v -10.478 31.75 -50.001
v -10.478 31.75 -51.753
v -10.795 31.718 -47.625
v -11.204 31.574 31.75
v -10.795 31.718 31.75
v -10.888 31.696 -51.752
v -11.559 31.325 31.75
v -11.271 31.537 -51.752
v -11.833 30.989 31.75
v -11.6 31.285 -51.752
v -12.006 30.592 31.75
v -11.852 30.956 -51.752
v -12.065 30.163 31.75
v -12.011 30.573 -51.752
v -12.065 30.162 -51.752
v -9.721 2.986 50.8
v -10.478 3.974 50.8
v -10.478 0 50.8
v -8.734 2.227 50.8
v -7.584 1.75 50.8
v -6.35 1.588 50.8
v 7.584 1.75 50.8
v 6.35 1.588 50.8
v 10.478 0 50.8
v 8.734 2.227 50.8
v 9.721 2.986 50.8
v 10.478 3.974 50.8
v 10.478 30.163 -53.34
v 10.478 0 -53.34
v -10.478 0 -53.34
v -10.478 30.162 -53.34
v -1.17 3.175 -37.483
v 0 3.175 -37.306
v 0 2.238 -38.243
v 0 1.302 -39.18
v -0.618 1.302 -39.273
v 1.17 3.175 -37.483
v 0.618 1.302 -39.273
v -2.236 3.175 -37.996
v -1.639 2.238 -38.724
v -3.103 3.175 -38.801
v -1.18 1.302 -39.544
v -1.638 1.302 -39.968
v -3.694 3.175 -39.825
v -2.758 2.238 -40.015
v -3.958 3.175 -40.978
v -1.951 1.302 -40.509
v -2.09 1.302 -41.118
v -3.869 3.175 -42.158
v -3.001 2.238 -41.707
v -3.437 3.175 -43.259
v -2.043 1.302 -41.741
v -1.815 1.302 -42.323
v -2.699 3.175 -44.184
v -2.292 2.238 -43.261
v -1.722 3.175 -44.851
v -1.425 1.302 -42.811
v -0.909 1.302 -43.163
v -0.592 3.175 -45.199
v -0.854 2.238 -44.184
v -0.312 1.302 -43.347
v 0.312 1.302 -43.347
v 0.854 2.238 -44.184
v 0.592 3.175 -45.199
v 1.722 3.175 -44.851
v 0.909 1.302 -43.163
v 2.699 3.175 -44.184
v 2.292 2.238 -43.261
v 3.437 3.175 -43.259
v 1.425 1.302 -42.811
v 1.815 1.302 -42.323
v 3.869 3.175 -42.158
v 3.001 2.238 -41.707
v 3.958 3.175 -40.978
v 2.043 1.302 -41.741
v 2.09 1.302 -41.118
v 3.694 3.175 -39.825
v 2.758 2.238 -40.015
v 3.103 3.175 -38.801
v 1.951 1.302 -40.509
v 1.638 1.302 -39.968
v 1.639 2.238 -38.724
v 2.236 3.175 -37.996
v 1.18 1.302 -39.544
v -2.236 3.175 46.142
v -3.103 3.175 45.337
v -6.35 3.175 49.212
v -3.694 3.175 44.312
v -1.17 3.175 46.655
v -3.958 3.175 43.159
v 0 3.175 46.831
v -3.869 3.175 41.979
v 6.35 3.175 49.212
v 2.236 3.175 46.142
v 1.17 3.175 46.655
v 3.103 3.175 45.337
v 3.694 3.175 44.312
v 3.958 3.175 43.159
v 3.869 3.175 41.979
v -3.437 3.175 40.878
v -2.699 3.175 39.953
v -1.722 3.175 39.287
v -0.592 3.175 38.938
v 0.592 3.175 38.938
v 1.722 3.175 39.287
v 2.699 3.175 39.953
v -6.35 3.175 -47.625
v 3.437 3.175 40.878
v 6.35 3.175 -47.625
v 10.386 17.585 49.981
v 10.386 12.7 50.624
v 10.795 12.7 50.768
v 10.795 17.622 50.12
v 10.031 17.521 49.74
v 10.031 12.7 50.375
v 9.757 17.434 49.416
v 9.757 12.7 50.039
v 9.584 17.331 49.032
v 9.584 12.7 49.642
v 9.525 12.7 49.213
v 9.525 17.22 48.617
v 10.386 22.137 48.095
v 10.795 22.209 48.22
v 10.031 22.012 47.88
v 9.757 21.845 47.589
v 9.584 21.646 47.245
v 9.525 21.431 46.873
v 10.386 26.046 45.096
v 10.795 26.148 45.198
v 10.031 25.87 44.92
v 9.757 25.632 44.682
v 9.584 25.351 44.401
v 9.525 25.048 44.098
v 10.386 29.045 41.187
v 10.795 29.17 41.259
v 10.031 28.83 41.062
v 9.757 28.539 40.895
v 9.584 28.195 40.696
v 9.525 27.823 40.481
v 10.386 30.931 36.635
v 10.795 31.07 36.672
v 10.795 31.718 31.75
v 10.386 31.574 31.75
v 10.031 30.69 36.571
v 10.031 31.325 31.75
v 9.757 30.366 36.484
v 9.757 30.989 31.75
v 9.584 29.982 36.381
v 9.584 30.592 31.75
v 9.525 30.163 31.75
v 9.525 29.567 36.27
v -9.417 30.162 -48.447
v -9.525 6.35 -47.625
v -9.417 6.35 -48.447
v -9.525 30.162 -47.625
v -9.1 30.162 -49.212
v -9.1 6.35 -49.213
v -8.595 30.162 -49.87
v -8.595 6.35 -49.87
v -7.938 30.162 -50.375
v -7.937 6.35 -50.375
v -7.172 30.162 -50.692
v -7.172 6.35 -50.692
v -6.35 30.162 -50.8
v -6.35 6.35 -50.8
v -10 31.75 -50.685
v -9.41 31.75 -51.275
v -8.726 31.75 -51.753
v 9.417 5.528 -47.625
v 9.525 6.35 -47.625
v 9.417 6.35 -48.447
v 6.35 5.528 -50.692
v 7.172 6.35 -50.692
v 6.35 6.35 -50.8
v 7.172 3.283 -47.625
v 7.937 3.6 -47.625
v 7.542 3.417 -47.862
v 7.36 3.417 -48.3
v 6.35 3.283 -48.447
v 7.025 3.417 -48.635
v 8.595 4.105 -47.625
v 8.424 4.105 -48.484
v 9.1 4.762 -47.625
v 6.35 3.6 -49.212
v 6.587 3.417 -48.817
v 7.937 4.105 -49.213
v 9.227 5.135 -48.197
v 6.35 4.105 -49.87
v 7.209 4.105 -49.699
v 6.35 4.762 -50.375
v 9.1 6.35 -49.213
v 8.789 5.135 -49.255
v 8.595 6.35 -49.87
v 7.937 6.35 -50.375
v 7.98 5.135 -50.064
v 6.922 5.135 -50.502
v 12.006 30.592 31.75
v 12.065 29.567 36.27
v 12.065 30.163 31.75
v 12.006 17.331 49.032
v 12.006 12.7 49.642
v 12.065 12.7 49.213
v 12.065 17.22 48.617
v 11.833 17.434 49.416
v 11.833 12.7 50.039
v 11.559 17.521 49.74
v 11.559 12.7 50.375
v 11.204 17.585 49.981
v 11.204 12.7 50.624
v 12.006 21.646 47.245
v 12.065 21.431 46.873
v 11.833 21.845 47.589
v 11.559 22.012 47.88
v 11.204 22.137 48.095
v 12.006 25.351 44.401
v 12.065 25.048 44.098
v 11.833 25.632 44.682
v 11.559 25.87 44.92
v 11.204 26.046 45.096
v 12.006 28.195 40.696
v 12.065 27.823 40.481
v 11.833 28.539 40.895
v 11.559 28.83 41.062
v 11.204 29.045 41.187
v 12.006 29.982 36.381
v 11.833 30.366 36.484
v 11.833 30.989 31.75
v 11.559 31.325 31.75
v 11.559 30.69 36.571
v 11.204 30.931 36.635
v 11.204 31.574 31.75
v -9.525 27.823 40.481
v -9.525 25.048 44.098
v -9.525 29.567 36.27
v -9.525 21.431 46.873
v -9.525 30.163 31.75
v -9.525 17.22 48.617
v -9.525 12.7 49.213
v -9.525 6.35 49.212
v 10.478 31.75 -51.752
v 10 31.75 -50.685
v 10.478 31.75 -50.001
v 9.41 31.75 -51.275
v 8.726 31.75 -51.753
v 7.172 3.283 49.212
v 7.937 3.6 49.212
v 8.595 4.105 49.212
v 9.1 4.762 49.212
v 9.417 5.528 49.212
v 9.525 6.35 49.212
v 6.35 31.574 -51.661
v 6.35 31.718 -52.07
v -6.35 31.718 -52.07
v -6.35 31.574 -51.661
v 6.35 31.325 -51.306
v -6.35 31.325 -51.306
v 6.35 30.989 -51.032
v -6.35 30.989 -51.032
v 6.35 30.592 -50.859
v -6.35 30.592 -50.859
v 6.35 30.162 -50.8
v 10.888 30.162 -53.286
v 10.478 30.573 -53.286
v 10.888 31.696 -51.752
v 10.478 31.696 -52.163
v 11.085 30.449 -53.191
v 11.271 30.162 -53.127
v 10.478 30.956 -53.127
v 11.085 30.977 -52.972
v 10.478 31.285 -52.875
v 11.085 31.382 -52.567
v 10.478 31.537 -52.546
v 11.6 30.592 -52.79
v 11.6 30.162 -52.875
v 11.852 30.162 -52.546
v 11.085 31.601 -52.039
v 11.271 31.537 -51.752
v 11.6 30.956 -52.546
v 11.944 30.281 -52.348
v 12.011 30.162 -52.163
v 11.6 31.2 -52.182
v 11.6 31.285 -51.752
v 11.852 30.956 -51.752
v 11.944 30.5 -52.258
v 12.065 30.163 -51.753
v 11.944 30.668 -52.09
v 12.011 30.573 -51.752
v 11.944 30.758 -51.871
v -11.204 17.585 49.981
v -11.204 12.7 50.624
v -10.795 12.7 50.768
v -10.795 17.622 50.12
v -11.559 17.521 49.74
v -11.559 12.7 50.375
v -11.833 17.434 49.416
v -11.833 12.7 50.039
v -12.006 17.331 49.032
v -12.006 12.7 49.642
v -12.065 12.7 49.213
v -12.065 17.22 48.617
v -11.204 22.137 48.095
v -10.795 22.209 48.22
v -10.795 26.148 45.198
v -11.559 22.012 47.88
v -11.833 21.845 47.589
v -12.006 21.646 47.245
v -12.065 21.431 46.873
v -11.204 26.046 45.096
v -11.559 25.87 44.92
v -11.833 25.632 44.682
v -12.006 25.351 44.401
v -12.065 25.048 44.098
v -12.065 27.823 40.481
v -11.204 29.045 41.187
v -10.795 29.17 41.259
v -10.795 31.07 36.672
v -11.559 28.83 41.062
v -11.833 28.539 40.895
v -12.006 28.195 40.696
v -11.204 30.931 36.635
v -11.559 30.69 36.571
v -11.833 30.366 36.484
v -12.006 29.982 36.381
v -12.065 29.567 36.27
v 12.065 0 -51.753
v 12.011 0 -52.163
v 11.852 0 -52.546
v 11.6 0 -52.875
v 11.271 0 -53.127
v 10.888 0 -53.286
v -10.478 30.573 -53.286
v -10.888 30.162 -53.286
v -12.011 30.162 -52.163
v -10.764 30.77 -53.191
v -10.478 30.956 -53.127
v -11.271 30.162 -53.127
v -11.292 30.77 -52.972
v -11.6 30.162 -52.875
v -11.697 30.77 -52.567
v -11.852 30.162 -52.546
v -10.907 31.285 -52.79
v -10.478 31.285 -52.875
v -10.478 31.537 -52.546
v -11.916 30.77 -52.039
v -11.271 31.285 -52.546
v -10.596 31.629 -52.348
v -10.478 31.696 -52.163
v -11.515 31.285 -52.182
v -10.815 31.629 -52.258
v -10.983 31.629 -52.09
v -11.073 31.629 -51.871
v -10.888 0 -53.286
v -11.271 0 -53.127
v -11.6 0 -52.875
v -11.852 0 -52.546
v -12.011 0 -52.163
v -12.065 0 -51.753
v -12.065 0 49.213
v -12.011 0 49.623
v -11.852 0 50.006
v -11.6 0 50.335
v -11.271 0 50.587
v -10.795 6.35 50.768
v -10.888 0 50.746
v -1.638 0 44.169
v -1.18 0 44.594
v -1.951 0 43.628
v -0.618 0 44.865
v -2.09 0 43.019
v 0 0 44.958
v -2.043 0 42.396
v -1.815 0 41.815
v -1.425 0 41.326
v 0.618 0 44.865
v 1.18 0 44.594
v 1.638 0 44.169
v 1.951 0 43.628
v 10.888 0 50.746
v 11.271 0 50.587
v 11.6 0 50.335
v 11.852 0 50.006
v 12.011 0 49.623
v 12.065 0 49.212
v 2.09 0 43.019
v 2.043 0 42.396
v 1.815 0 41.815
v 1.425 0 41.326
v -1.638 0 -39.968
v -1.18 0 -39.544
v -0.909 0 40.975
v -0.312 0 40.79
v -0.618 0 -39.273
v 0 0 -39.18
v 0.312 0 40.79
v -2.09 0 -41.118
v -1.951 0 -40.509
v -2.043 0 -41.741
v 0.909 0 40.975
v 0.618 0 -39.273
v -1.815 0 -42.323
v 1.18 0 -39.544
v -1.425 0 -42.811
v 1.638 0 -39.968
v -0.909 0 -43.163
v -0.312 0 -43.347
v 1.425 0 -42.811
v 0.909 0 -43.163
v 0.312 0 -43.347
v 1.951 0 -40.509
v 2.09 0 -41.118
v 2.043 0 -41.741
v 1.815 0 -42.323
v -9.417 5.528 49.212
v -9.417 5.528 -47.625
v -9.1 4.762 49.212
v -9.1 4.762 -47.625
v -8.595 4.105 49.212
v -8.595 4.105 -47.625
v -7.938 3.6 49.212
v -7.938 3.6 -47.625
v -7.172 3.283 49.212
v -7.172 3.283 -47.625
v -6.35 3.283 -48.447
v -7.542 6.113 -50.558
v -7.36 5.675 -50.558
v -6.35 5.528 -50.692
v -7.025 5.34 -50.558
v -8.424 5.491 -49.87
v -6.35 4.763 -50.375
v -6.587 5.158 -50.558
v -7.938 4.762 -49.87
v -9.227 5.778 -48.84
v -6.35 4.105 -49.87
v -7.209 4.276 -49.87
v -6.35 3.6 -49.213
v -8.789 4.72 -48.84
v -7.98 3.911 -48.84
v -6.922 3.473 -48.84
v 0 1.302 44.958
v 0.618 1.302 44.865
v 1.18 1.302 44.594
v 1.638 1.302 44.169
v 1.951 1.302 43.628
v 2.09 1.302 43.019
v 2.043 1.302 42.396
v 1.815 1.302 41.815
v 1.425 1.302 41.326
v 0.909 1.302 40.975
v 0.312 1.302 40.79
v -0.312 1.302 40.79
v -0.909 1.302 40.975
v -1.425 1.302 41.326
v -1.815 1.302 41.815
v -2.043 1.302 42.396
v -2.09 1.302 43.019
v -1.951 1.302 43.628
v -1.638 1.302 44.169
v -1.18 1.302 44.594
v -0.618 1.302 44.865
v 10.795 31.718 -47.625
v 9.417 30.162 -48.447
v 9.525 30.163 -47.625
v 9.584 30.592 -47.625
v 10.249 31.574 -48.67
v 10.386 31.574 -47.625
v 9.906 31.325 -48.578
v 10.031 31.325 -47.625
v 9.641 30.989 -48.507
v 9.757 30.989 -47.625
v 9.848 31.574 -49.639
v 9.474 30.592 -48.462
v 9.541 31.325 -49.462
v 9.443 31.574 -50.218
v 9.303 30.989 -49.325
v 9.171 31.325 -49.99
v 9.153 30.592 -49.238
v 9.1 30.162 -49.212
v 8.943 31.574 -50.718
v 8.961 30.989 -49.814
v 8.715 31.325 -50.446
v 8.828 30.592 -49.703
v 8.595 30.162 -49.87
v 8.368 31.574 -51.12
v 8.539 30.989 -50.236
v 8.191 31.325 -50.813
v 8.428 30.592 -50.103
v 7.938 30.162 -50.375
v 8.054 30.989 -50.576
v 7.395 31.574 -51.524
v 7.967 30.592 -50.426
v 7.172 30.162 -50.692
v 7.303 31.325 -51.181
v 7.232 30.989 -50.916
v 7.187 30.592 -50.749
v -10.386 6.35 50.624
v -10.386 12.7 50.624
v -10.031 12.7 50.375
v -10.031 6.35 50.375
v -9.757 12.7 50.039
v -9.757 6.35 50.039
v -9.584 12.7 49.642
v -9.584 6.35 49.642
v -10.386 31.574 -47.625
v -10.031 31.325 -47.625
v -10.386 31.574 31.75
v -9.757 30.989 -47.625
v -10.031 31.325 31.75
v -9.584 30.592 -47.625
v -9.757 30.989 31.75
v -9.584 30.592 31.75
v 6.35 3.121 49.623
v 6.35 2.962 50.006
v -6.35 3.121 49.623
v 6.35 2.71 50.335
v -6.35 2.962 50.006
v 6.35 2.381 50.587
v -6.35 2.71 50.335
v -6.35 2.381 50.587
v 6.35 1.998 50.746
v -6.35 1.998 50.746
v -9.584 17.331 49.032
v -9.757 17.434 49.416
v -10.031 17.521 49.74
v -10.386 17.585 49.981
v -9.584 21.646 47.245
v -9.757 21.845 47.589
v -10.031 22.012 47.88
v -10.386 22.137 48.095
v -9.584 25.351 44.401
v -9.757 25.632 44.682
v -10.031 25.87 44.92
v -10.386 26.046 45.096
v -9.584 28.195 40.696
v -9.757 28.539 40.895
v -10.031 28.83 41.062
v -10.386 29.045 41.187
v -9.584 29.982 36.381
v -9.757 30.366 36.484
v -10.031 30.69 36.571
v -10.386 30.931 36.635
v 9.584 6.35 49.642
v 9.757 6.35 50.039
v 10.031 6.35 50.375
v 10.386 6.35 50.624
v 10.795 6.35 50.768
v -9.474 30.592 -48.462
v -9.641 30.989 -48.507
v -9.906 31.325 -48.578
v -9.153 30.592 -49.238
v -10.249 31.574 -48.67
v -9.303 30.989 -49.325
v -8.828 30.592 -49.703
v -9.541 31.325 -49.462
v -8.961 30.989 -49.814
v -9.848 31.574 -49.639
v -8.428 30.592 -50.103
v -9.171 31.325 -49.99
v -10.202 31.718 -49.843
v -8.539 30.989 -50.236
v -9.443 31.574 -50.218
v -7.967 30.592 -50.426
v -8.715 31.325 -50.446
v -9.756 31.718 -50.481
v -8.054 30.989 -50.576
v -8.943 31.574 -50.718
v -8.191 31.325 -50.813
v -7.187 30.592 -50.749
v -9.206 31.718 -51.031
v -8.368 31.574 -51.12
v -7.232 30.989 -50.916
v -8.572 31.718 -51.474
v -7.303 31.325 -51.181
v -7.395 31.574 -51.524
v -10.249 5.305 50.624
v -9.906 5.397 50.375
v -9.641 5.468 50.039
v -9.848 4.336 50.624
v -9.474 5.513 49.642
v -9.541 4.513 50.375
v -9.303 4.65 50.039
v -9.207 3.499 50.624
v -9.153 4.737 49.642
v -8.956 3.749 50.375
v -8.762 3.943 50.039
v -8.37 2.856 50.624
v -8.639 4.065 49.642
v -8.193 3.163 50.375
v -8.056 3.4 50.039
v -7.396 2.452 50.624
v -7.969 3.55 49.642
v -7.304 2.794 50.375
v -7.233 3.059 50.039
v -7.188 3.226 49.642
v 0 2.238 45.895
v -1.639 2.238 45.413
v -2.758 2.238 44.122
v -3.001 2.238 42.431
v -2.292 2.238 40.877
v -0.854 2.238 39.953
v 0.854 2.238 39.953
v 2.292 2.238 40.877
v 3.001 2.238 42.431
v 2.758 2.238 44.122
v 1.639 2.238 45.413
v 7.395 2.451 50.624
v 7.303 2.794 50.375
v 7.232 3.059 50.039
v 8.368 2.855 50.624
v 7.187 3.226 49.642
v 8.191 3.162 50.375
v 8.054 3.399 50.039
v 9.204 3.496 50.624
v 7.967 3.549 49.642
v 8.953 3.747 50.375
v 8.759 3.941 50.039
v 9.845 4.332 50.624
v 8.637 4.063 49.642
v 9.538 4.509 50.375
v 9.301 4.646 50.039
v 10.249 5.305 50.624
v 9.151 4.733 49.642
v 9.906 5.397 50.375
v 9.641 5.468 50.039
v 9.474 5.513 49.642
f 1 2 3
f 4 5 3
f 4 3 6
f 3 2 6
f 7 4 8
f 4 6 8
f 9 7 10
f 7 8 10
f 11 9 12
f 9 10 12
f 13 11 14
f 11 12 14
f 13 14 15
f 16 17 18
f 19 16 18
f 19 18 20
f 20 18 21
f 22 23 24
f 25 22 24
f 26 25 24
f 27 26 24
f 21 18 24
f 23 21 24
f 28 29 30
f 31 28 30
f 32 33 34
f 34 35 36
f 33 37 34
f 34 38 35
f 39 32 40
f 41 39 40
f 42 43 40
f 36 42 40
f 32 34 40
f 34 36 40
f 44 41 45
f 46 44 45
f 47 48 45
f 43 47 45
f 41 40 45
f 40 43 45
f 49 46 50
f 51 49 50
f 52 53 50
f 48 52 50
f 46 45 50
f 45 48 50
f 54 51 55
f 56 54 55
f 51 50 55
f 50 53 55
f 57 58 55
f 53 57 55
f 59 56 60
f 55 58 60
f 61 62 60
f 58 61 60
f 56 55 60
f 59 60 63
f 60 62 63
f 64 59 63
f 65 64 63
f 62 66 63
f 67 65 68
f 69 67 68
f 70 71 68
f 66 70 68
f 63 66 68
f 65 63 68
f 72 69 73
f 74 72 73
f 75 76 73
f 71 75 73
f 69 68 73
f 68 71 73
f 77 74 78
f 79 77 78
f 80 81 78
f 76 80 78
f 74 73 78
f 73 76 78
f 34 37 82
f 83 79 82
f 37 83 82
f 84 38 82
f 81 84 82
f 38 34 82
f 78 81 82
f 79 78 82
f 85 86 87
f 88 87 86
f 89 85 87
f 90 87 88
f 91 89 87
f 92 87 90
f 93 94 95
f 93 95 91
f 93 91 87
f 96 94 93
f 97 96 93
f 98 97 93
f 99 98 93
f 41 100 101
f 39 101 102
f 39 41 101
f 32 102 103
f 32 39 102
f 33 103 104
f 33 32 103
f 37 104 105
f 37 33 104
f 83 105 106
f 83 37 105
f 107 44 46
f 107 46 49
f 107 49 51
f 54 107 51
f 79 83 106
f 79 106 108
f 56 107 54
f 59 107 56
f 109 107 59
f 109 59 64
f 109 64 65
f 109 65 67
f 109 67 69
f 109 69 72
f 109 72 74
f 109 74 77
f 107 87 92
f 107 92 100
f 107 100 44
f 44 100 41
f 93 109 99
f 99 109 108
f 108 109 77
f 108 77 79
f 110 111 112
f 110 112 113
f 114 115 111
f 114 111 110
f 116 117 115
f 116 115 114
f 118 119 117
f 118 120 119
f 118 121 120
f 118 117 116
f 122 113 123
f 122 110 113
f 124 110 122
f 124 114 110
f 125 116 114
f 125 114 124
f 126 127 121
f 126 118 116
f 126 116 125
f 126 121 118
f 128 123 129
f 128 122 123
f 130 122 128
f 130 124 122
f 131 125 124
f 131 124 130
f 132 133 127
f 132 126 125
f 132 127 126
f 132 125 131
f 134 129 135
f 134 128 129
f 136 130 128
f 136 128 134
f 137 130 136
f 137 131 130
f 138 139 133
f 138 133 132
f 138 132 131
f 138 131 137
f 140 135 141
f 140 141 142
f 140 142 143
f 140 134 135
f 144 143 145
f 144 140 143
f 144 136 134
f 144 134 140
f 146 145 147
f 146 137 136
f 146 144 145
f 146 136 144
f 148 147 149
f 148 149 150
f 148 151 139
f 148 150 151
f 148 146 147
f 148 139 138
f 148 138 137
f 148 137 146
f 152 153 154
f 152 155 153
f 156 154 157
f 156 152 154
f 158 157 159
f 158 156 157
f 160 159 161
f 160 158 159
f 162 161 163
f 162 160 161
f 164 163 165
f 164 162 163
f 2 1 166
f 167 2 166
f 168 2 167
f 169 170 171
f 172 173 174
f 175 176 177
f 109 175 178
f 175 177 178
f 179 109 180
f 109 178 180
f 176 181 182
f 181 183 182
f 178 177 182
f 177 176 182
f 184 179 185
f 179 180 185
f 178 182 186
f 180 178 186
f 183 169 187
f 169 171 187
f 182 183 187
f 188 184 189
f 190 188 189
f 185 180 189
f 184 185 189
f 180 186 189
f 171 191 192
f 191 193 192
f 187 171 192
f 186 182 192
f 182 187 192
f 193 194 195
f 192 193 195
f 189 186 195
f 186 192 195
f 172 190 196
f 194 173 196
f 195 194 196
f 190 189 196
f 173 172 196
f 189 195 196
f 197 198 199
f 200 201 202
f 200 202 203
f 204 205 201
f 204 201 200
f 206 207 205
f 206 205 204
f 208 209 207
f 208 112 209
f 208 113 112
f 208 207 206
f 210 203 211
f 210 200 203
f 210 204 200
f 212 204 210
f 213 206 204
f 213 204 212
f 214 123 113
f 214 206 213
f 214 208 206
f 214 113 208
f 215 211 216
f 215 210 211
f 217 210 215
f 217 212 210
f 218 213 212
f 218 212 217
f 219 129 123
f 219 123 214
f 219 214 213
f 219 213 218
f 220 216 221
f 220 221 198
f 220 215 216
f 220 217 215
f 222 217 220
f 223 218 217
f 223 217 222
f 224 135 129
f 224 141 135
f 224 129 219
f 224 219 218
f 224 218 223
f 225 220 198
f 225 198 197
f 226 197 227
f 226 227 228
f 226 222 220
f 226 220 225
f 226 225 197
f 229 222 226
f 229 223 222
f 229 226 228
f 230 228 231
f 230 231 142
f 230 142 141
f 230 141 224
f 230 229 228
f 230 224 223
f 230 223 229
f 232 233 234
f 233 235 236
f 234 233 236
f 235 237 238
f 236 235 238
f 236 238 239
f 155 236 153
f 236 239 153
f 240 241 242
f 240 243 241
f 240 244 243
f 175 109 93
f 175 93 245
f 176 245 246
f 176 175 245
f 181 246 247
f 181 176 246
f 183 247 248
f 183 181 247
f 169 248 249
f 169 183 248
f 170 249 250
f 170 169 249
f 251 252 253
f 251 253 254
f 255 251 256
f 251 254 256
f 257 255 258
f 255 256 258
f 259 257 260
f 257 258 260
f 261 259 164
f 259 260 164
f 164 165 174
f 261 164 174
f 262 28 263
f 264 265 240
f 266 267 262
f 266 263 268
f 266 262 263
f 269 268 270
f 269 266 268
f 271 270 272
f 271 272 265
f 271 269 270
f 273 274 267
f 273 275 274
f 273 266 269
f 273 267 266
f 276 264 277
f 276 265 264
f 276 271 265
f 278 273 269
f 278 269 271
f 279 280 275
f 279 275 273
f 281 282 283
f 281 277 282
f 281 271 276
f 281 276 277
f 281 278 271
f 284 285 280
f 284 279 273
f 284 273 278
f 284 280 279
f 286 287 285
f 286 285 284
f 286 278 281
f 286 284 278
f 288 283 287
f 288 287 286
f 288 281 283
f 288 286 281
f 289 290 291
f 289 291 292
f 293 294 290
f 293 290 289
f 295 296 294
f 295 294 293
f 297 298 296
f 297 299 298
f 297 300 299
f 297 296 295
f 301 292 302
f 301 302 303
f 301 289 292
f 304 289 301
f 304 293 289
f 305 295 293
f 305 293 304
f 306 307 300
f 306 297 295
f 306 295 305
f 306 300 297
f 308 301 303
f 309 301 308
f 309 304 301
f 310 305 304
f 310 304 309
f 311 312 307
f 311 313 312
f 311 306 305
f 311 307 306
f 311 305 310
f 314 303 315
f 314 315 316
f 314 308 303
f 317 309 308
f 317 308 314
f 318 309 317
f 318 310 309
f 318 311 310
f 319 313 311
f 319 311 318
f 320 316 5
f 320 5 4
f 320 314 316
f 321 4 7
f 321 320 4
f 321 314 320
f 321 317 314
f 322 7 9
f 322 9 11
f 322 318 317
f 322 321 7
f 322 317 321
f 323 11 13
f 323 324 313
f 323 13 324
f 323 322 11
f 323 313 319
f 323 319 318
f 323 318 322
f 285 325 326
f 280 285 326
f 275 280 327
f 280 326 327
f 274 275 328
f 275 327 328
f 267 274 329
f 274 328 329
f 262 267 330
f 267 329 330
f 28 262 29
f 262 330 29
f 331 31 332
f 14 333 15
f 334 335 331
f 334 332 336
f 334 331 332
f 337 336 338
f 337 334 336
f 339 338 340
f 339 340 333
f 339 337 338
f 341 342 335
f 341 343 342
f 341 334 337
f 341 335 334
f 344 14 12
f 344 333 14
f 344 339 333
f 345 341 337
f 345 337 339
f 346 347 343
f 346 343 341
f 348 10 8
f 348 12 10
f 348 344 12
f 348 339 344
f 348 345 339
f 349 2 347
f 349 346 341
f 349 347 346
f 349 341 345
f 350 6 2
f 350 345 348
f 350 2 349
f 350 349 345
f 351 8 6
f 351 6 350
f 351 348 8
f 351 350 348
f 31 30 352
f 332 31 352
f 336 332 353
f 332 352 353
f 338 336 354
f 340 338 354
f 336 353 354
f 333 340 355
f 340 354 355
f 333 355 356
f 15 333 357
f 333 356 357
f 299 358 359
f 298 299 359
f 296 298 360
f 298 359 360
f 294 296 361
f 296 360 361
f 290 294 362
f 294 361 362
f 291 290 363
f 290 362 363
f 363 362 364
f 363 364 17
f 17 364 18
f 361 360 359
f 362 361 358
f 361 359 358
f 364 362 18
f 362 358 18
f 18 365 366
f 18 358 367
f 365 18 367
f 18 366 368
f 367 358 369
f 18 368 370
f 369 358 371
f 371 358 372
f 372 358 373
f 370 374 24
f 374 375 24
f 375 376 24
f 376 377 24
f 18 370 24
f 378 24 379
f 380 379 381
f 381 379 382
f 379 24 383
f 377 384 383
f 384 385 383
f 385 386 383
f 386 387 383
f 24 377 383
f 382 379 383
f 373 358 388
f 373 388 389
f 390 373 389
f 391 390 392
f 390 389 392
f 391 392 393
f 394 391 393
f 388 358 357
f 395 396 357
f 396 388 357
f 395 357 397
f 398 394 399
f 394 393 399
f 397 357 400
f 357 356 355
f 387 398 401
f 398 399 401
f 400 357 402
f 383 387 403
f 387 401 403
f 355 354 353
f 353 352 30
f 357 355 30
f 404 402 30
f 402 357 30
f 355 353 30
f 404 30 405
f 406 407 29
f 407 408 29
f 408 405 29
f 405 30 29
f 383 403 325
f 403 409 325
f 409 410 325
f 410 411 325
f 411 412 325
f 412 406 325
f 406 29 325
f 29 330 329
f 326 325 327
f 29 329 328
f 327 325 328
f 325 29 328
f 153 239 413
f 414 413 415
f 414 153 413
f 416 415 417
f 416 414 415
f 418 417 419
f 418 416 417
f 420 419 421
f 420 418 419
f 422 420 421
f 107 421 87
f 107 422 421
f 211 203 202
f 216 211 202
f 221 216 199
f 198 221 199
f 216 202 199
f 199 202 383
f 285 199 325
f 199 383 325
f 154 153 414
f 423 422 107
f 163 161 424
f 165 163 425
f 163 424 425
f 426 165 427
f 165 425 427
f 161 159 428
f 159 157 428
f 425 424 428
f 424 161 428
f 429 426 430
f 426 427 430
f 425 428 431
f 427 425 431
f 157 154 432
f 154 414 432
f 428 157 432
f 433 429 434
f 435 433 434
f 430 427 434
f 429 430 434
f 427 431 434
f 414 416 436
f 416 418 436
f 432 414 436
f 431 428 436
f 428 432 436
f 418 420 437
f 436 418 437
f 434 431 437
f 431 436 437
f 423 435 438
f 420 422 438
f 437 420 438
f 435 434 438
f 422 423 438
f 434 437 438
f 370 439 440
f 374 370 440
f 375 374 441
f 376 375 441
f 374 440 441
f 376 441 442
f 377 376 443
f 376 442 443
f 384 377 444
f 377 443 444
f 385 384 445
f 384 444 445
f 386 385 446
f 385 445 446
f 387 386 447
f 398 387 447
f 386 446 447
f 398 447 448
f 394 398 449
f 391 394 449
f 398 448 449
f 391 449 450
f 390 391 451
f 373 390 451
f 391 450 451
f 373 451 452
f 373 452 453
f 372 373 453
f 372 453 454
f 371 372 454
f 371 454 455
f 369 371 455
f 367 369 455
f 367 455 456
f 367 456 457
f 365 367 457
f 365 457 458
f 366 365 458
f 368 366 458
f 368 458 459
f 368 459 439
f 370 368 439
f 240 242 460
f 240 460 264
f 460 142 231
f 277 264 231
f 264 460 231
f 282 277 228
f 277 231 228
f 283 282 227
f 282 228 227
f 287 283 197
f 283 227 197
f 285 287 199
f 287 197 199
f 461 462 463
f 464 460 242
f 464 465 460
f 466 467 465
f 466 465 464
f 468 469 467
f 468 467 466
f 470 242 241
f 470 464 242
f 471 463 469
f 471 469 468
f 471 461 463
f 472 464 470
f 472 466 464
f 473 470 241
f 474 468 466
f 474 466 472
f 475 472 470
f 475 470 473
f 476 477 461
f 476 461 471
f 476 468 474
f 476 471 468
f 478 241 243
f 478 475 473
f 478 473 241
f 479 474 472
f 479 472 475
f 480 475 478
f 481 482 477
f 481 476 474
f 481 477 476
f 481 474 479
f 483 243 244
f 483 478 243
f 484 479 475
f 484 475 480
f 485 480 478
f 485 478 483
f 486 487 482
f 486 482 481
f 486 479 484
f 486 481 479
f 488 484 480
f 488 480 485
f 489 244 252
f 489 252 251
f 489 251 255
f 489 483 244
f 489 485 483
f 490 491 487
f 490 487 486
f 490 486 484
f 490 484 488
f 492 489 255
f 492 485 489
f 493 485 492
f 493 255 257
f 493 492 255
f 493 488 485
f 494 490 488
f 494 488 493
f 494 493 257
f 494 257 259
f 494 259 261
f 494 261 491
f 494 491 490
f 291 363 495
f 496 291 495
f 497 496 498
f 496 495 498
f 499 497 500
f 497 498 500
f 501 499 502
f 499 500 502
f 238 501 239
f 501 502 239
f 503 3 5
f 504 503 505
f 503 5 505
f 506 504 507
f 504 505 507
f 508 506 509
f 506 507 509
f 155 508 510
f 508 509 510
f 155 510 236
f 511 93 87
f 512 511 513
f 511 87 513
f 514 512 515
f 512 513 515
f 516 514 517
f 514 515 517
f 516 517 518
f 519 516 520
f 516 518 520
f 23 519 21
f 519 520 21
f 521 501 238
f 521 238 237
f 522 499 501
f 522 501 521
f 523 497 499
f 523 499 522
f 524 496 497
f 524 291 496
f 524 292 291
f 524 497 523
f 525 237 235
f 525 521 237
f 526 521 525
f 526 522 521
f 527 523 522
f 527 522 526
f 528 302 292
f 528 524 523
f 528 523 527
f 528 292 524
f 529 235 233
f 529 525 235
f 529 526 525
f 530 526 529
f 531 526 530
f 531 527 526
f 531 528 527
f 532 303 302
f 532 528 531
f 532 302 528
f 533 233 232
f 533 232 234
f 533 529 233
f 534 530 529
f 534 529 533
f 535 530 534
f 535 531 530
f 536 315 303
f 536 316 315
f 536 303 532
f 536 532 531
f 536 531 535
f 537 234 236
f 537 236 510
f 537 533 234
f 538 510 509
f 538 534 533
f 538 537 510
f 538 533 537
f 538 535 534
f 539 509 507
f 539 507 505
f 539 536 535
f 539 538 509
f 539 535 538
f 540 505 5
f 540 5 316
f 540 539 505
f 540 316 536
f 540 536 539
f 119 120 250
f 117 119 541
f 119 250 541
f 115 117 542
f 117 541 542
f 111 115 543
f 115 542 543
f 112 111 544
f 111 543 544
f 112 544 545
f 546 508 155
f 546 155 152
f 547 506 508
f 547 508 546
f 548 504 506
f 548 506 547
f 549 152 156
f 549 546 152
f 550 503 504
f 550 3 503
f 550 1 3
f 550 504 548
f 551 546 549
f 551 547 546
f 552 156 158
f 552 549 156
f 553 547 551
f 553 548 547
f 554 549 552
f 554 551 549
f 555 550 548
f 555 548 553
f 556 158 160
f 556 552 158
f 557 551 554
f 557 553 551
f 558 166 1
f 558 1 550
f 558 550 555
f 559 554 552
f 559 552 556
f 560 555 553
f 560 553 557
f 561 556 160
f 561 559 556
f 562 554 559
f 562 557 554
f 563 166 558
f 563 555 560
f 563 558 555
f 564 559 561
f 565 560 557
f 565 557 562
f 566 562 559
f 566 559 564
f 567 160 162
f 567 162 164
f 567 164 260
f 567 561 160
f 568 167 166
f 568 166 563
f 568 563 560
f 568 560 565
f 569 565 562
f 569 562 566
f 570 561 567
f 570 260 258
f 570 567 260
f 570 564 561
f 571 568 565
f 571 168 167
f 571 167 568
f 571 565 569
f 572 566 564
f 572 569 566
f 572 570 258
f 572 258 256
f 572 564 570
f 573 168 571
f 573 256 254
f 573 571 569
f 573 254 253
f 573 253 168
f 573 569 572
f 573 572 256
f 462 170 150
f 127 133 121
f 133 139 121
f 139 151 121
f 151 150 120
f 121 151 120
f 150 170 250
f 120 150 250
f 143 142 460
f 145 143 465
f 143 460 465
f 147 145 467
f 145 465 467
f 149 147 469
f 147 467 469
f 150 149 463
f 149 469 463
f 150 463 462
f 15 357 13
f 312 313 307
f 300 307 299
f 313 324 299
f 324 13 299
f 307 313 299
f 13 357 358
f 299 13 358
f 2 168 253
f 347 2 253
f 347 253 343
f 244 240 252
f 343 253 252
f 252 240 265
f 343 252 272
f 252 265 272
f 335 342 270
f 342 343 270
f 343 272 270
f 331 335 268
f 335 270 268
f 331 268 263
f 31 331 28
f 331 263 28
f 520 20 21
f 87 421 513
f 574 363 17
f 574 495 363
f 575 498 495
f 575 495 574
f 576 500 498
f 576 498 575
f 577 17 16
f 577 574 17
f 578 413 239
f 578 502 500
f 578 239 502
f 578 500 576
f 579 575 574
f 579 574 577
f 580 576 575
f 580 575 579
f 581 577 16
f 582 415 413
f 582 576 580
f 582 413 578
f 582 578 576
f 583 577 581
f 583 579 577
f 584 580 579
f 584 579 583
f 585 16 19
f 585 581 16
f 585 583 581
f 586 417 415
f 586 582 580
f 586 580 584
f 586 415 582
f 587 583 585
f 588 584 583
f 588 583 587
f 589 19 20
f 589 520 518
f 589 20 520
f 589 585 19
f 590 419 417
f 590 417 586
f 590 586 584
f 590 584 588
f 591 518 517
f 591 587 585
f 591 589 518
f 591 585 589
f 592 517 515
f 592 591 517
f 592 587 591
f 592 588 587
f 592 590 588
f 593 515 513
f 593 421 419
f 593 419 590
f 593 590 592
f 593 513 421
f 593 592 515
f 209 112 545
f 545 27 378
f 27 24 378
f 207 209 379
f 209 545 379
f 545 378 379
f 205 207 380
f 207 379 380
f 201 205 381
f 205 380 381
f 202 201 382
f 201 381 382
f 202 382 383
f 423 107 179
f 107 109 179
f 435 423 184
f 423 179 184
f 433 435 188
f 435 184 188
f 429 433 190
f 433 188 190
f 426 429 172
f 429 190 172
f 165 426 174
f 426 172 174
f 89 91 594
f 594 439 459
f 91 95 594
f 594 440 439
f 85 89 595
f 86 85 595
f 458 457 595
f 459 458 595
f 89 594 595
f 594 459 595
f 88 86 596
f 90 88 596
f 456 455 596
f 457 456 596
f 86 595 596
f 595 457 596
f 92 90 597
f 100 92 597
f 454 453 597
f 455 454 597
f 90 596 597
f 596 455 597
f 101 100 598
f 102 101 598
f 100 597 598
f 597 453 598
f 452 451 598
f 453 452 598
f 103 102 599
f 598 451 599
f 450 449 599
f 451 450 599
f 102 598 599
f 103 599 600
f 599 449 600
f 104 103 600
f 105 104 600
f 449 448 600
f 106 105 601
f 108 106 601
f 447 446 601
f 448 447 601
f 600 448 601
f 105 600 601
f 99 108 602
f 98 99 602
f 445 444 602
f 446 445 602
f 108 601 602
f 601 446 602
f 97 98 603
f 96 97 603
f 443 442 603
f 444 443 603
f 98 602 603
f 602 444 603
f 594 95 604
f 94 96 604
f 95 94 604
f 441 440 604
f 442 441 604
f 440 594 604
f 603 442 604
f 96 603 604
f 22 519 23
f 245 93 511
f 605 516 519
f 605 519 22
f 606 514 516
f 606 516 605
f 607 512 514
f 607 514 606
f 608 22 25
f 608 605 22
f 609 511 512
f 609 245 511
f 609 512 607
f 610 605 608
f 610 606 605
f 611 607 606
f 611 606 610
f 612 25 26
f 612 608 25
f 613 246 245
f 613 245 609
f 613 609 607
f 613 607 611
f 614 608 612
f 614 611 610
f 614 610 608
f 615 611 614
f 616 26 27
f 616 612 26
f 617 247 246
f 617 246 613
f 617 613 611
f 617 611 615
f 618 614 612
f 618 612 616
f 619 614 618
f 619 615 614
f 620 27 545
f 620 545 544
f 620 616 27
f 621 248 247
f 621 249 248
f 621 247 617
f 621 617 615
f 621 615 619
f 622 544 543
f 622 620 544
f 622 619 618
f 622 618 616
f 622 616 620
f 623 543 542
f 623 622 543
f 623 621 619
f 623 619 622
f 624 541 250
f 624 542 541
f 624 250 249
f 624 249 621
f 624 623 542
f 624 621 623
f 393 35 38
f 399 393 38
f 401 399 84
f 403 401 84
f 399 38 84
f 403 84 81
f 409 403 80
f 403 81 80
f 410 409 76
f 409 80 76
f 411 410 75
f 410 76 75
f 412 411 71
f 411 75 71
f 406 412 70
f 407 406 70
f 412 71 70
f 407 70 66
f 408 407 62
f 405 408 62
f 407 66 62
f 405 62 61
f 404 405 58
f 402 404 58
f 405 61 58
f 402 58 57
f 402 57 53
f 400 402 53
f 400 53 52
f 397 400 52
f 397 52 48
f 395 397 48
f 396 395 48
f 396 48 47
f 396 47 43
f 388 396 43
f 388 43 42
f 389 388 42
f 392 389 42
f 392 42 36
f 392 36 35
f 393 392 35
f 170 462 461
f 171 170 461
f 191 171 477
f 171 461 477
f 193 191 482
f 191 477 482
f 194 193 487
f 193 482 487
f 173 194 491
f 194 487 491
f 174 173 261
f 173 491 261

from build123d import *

# Parameters (mm, degrees)
SKETCH1_W           = 19.05
SKETCH1_H           = 101.6
BOSS_EXTRUDE1_DEPTH = 3.175
BOSS_EXTRUDE2_DEPTH = 31.75
FILLET1_R           = 19.05
FILLET2_R           = 3.175
FILLET3_R           = 1.5875
SKETCH3_R           = 2.0955
CUT_EXTRUDE1_DEPTH  = 62.702921072


with BuildPart() as part:
    # Sketch1 → Boss-Extrude1 (new body)
    with BuildSketch(Plane(origin=(0, 0, 0), x_dir=(1, 0, 0), z_dir=(0, 1, 0))):
        Rectangle(SKETCH1_W, SKETCH1_H)
    extrude(amount=BOSS_EXTRUDE1_DEPTH)

    # Sketch2 → Boss-Extrude2 (add)
    with BuildSketch(Plane(origin=(0, 0, 0), x_dir=(1, 0, 0), z_dir=(0, 1, 0))):
        Polygon((-12.065, 53.34), (-12.065, -50.8), (-9.525, -50.8), (-9.525, 50.8), (9.525, 50.8), (9.525, -50.8), (12.065, -50.8), (12.065, 53.34), align=None)
    extrude(amount=BOSS_EXTRUDE2_DEPTH)

    # Fillet1
    fillet1_edges = [part.edges().sort_by_distance(p)[0] for p in [
        (10.795, 31.75, 50.8),
        (-10.795, 31.75, 50.8),
    ]]
    fillet(fillet1_edges, radius=FILLET1_R)

    # Fillet2
    fillet2_edges = [part.edges().sort_by_distance(p)[0] for p in [
        (-9.525, 3.175, 0),
        (-9.525, 17.4625, -50.8),
        (9.525, 17.4625, -50.8),
        (9.525, 3.175, 0),
        (0, 3.175, -50.8),
    ]]
    fillet(fillet2_edges, radius=FILLET2_R)

    # Fillet3
    # the kernel refuses this fillet: 1.5875 mm, written as the material it takes off along each edge
    with BuildSketch(Plane(origin=(-10.4775, 30.1625, -51.7525), x_dir=(-1, 0, 0), z_dir=(0, 1, 0))) as fillet3_piece_1_section:
        Polygon((0, 0), (FILLET3_R, 0), (FILLET3_R, -FILLET3_R), (0, -FILLET3_R), align=None)
    fillet3_piece_1 = extrude(amount=FILLET3_R, mode=Mode.PRIVATE)
    fillet3_piece_1 = fillet3_piece_1 - Plane(origin=(-10.4775, 30.1625, -51.7525), x_dir=(0.7071067811865475, 0, 0.7071067811865475), z_dir=(0, 1, 0)) * Sphere(FILLET3_R, mode=Mode.PRIVATE)
    add(fillet3_piece_1, mode=Mode.SUBTRACT)
    with BuildSketch(Plane(origin=(10.4775, 30.1625, -51.7525), x_dir=(0, 1, 0), z_dir=(1, 0, 0))) as fillet3_piece_2_section:
        Polygon((0, 0), (FILLET3_R, 0), (FILLET3_R, -FILLET3_R), (0, -FILLET3_R), align=None)
    fillet3_piece_2 = extrude(amount=FILLET3_R, mode=Mode.PRIVATE)
    fillet3_piece_2 = fillet3_piece_2 - Plane(origin=(10.4775, 30.1625, -51.7525), x_dir=(0, -0.7071067811865475, 0.7071067811865475), z_dir=(1, 0, 0)) * Sphere(FILLET3_R, mode=Mode.PRIVATE)
    add(fillet3_piece_2, mode=Mode.SUBTRACT)
    with BuildSketch(Plane(origin=(12.065, 12.7, 31.75), x_dir=(0, 0, 1), z_dir=(0, -1, 0))) as fillet3_piece_3:
        with BuildLine():
            CenterArc((19.05 - FILLET3_R, FILLET3_R), FILLET3_R, 270, 90)
            Line((19.05, FILLET3_R), (19.05, 0))
            Line((19.05, 0), (19.05 - FILLET3_R, 0))
        make_face()
    revolve(axis=Axis((12.065, 12.7, 31.75), (-1, 0, 0)), revolution_arc=90, mode=Mode.SUBTRACT)
    with BuildSketch(Plane(origin=(-12.065, 12.7, 31.75), x_dir=(0, 0, 1), z_dir=(0, -1, 0))) as fillet3_piece_4:
        with BuildLine():
            CenterArc((19.05 - FILLET3_R, -FILLET3_R), FILLET3_R, 0, 90)
            Line((19.05 - FILLET3_R, 0), (19.05, 0))
            Line((19.05, 0), (19.05, -FILLET3_R))
        make_face()
    revolve(axis=Axis((-12.065, 12.7, 31.75), (-1, 0, 0)), revolution_arc=90, mode=Mode.SUBTRACT)
    with BuildSketch(Plane(origin=(-9.525, 12.7, 31.75), x_dir=(0, 0, 1), z_dir=(0, -1, 0))) as fillet3_piece_5:
        with BuildLine():
            CenterArc((19.05 - FILLET3_R, FILLET3_R), FILLET3_R, 270, 90)
            Line((19.05, FILLET3_R), (19.05, 0))
            Line((19.05, 0), (19.05 - FILLET3_R, 0))
        make_face()
    revolve(axis=Axis((-9.525, 12.7, 31.75), (-1, 0, 0)), revolution_arc=90, mode=Mode.SUBTRACT)
    with BuildSketch(Plane(origin=(9.525, 12.7, 31.75), x_dir=(0, 0, 1), z_dir=(0, -1, 0))) as fillet3_piece_6:
        with BuildLine():
            CenterArc((19.05 - FILLET3_R, -FILLET3_R), FILLET3_R, 0, 90)
            Line((19.05, -FILLET3_R), (19.05, 0))
            Line((19.05, 0), (19.05 - FILLET3_R, 0))
        make_face()
    revolve(axis=Axis((9.525, 12.7, 31.75), (-1, 0, 0)), revolution_arc=90, mode=Mode.SUBTRACT)
    with BuildSketch(Plane(origin=(9.525, 6.35, 50.8), x_dir=(1, 0, 0), z_dir=(0, 1, 0))) as fillet3_piece_7:
        with BuildLine():
            CenterArc((FILLET3_R, FILLET3_R), FILLET3_R, 180, 90)
            Line((0, FILLET3_R), (0, 0))
            Line((0, 0), (FILLET3_R, 0))
        make_face()
    extrude(amount=6.35, mode=Mode.SUBTRACT)
    with BuildSketch(Plane(origin=(6.35, 6.35, 50.8), x_dir=(0, -1, 0), z_dir=(-1, 0, 0))) as fillet3_piece_8:
        with BuildLine():
            CenterArc((3.175 + FILLET3_R, -FILLET3_R), FILLET3_R, 90, 90)
            Line((3.175, -FILLET3_R), (3.175, 0))
            Line((3.175, 0), (3.175 + FILLET3_R, 0))
        make_face()
    revolve(axis=Axis((6.35, 6.35, 50.8), (0, 0, 1)), revolution_arc=90, mode=Mode.SUBTRACT)
    with BuildSketch(Plane(origin=(-6.35, 3.175, 50.8), x_dir=(0, -1, 0), z_dir=(1, 0, 0))) as fillet3_piece_9:
        with BuildLine():
            CenterArc((FILLET3_R, FILLET3_R), FILLET3_R, 180, 90)
            Line((0, FILLET3_R), (0, 0))
            Line((0, 0), (FILLET3_R, 0))
        make_face()
    extrude(amount=12.7, mode=Mode.SUBTRACT)
    with BuildSketch(Plane(origin=(-6.35, 6.35, 50.8), x_dir=(-1, 0, 0), z_dir=(0, 1, 0))) as fillet3_piece_10:
        with BuildLine():
            CenterArc((3.175 + FILLET3_R, -FILLET3_R), FILLET3_R, 90, 90)
            Line((3.175, -FILLET3_R), (3.175, 0))
            Line((3.175, 0), (3.175 + FILLET3_R, 0))
        make_face()
    revolve(axis=Axis((-6.35, 6.35, 50.8), (0, 0, 1)), revolution_arc=90, mode=Mode.SUBTRACT)
    with BuildSketch(Plane(origin=(-6.35, 31.75, -47.625), x_dir=(-1, 0, 0), z_dir=(0, 0, 1))) as fillet3_piece_11:
        with BuildLine():
            CenterArc((3.175 + FILLET3_R, FILLET3_R), FILLET3_R, 180, 90)
            Line((3.175, FILLET3_R), (3.175, 0))
            Line((3.175, 0), (3.175 + FILLET3_R, 0))
        make_face()
    revolve(axis=Axis((-6.35, 31.75, -47.625), (0, -1, 0)), revolution_arc=90, mode=Mode.SUBTRACT)
    with BuildSketch(Plane(origin=(-9.525, 31.75, 31.75), x_dir=(0, -1, 0), z_dir=(0, 0, -1)), Plane(origin=(9.525, 31.75, -47.625), x_dir=(0, -1, 0), z_dir=(0, 0, 1))) as fillet3_piece_12:
        with BuildLine():
            CenterArc((FILLET3_R, FILLET3_R), FILLET3_R, 180, 90)
            Line((0, FILLET3_R), (0, 0))
            Line((0, 0), (FILLET3_R, 0))
        make_face()
    extrude(amount=79.375, mode=Mode.SUBTRACT)
    with BuildSketch(Plane(origin=(-12.065, 31.75, -51.7525), x_dir=(0, -1, 0), z_dir=(0, 0, 1)), Plane(origin=(12.065, 31.75, 31.75), x_dir=(0, -1, 0), z_dir=(0, 0, -1))) as fillet3_piece_13:
        with BuildLine():
            CenterArc((FILLET3_R, FILLET3_R), FILLET3_R, 180, 90)
            Line((0, FILLET3_R), (0, 0))
            Line((0, 0), (FILLET3_R, 0))
        make_face()
    extrude(amount=83.5025, mode=Mode.SUBTRACT)
    with BuildSketch(Plane(origin=(10.4775, 31.75, -53.34), x_dir=(0, 0, 1), z_dir=(-1, 0, 0))) as fillet3_piece_14:
        with BuildLine():
            CenterArc((FILLET3_R, -FILLET3_R), FILLET3_R, 90, 90)
            Line((0, -FILLET3_R), (0, 0))
            Line((0, 0), (FILLET3_R, 0))
        make_face()
    extrude(amount=20.955, mode=Mode.SUBTRACT)
    with BuildSketch(Plane(origin=(6.35, 31.75, -47.625), x_dir=(1, 0, 0), z_dir=(0, 0, 1))) as fillet3_piece_15:
        with BuildLine():
            CenterArc((3.175 + FILLET3_R, -FILLET3_R), FILLET3_R, 90, 90)
            Line((3.175, -FILLET3_R), (3.175, 0))
            Line((3.175, 0), (3.175 + FILLET3_R, 0))
        make_face()
    revolve(axis=Axis((6.35, 31.75, -47.625), (0, 1, 0)), revolution_arc=90, mode=Mode.SUBTRACT)
    with BuildSketch(Plane(origin=(-6.35, 31.75, -50.8), x_dir=(0, 0, -1), z_dir=(1, 0, 0))) as fillet3_piece_16:
        with BuildLine():
            CenterArc((FILLET3_R, -FILLET3_R), FILLET3_R, 90, 90)
            Line((0, -FILLET3_R), (0, 0))
            Line((0, 0), (FILLET3_R, 0))
        make_face()
    extrude(amount=12.7, mode=Mode.SUBTRACT)
    with BuildSketch(Plane(origin=(-12.065, -3.96875, -53.34), x_dir=(0, 0, 1), z_dir=(0, 1, 0))) as fillet3_piece_17:
        with BuildLine():
            CenterArc((FILLET3_R, FILLET3_R), FILLET3_R, 180, 90)
            Line((0, FILLET3_R), (0, 0))
            Line((0, 0), (FILLET3_R, 0))
        make_face()
    extrude(amount=34.13125, mode=Mode.SUBTRACT)
    with BuildSketch(Plane(origin=(12.065, -3.96875, -53.34), x_dir=(0, 0, 1), z_dir=(0, 1, 0))) as fillet3_piece_18:
        with BuildLine():
            CenterArc((FILLET3_R, -FILLET3_R), FILLET3_R, 90, 90)
            Line((0, -FILLET3_R), (0, 0))
            Line((0, 0), (FILLET3_R, 0))
        make_face()
    extrude(amount=34.13125, mode=Mode.SUBTRACT)
    with BuildSketch(Plane(origin=(12.065, -3.96875, 50.8), x_dir=(-1, 0, 0), z_dir=(0, 1, 0))) as fillet3_piece_19:
        with BuildLine():
            CenterArc((FILLET3_R, -FILLET3_R), FILLET3_R, 90, 90)
            Line((0, -FILLET3_R), (0, 0))
            Line((0, 0), (FILLET3_R, 0))
        make_face()
    extrude(amount=16.66875, mode=Mode.SUBTRACT)
    with BuildSketch(Plane(origin=(-12.065, -3.96875, 50.8), x_dir=(1, 0, 0), z_dir=(0, 1, 0))) as fillet3_piece_20:
        with BuildLine():
            CenterArc((FILLET3_R, FILLET3_R), FILLET3_R, 180, 90)
            Line((0, FILLET3_R), (0, 0))
            Line((0, 0), (FILLET3_R, 0))
        make_face()
    extrude(amount=16.66875, mode=Mode.SUBTRACT)
    with BuildSketch(Plane(origin=(-9.525, 6.35, 50.8), x_dir=(-1, 0, 0), z_dir=(0, 1, 0))) as fillet3_piece_21:
        with BuildLine():
            CenterArc((FILLET3_R, -FILLET3_R), FILLET3_R, 90, 90)
            Line((0, -FILLET3_R), (0, 0))
            Line((0, 0), (FILLET3_R, 0))
        make_face()
    extrude(amount=6.35, mode=Mode.SUBTRACT)

    # Sketch3 → Cut-Extrude1 (cut, through all)
    with BuildSketch(Plane(origin=(0, 3.175, 0), x_dir=(1, 0, 0), z_dir=(0, 1, 0))):
        with Locations(Location((0, 41.275, 0), (0, 0, 270))):
            Circle(SKETCH3_R)
        with Locations(Location((0, -42.8625, 0), (0, 0, 270))):
            Circle(SKETCH3_R)
    extrude(amount=-CUT_EXTRUDE1_DEPTH, mode=Mode.SUBTRACT)

    # Cut-Extrude2 cone 1 section (through the dimple's axis) → Cut-Extrude2 (revolve, cut)
    with BuildSketch(Plane(origin=(0, 3.175, -41.275), x_dir=(0, 0, 1), z_dir=(1, 0, 0))):
        Polygon((0, 0), (3.96875, 0), (0, 3.96875), align=None)
    revolve(axis=Axis((0, 3.175, -41.275), (0, -1, 0)), mode=Mode.SUBTRACT)

    # Cut-Extrude2 cone 2 section (through the dimple's axis) → Cut-Extrude2 cone 2 (revolve, cut)
    with BuildSketch(Plane(origin=(0, 3.175, 42.8625), x_dir=(0, 0, 1), z_dir=(1, 0, 0))):
        Polygon((0, 0), (3.96875, 0), (0, 3.96875), align=None)
    revolve(axis=Axis((0, 3.175, 42.8625), (0, -1, 0)), mode=Mode.SUBTRACT)


solid = part.part
